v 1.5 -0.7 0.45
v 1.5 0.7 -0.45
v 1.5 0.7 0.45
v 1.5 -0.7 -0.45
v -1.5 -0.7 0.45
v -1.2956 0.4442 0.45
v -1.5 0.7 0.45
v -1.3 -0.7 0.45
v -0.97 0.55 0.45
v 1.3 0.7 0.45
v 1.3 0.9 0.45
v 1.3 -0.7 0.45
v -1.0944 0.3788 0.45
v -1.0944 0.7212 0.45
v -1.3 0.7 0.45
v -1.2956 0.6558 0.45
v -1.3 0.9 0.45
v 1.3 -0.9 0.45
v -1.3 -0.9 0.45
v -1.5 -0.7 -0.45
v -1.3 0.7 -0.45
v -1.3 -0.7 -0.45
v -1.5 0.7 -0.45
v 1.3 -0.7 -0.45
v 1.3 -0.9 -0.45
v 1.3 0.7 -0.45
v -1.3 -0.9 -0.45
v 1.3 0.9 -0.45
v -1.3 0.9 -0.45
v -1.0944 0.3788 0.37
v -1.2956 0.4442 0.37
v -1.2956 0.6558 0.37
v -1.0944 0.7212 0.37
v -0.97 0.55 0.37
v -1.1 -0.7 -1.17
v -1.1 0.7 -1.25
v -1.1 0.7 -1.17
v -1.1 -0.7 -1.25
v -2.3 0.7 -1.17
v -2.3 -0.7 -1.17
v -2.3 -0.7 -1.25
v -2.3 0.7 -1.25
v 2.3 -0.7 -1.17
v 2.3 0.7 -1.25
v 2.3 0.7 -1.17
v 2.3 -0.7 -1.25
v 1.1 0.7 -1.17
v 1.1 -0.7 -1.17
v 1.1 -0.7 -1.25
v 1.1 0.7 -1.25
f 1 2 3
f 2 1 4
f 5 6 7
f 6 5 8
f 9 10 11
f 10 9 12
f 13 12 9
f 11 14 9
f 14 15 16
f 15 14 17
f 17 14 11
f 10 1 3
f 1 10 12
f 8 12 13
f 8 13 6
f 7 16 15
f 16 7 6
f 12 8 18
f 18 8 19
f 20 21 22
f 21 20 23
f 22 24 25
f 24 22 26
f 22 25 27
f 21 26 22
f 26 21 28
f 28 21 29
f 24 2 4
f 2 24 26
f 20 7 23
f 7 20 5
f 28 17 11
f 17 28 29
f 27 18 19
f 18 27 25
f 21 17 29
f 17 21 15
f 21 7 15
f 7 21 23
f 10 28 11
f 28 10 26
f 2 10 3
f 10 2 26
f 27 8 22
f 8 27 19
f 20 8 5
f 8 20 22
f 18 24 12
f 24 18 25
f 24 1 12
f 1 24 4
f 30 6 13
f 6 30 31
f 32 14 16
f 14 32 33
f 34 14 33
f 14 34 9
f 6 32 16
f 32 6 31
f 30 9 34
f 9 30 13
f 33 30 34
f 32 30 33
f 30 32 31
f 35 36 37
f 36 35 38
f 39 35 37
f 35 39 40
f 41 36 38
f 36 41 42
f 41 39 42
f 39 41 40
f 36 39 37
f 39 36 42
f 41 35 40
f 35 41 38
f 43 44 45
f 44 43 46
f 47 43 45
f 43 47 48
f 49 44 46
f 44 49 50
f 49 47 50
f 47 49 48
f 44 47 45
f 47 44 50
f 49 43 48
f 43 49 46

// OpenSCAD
// Parameters
body_length = 3.0; //[1.5:6.0:0.1]
body_width = 1.8; //[0.9:3.6:0.1]
body_height = 0.9; //[0.45:1.8:0.05]
pad_length = 0.6; //[0.3:1.2:0.05]
pad_width = 1.4; //[0.7:1.8:0.05]
pad_thickness = 0.08; //[0.03:0.2:0.01]
pad_overlap = 0.6; //[0.3:1.2:0.05]
polarity_mark_radius = 0.18; //[0.1:0.4:0.01]
polarity_mark_depth = 0.08; //[0.03:0.2:0.01]
polarity_mark_edge_margin = 0.35; //[0.2:0.8:0.05]
chamfer_size = 0.2; //[0.1:0.5:0.05]
connect_overlap = 0.8; //[0.5:2.0:0.1]

// Main body with chamfers
module main_body() {
  difference() {
    cube([body_length, body_width, body_height], center=true);
    translate([-body_length/2 + chamfer_size/2, body_width/2 - chamfer_size/2, 0])
      cube([chamfer_size, chamfer_size, body_height + 2*connect_overlap], center=true);
    translate([body_length/2 - chamfer_size/2, body_width/2 - chamfer_size/2, 0])
      cube([chamfer_size, chamfer_size, body_height + 2*connect_overlap], center=true);
    translate([-body_length/2 + chamfer_size/2, -body_width/2 + chamfer_size/2, 0])
      cube([chamfer_size, chamfer_size, body_height + 2*connect_overlap], center=true);
    translate([body_length/2 - chamfer_size/2, -body_width/2 + chamfer_size/2, 0])
      cube([chamfer_size, chamfer_size, body_height + 2*connect_overlap], center=true);
  }
}

// Polarity mark
module polarity_mark() {
  difference() {
    main_body();
    translate([-body_length/2 + polarity_mark_edge_margin, body_width/2 - polarity_mark_edge_margin, body_height/2 - polarity_mark_depth/2 + connect_overlap/2])
      cylinder(r=polarity_mark_radius, h=polarity_mark_depth + connect_overlap, center=true);
  }
}

// Terminal pads
module terminal_pads() {
  union() {
    translate([-body_length/2 + (pad_length + pad_overlap)/2 - connect_overlap, 0, -body_height/2 + pad_thickness/2 - connect_overlap])
      cube([pad_length + pad_overlap, pad_width, pad_thickness], center=true);
    translate([body_length/2 - (pad_length + pad_overlap)/2 + connect_overlap, 0, -body_height/2 + pad_thickness/2 - connect_overlap])
      cube([pad_length + pad_overlap, pad_width, pad_thickness], center=true);
  }
}

// Complete SMD package
module smd_complete() {
  union() {
    polarity_mark();
    terminal_pads();
  }
}

// Render the final SMD package
smd_complete();
